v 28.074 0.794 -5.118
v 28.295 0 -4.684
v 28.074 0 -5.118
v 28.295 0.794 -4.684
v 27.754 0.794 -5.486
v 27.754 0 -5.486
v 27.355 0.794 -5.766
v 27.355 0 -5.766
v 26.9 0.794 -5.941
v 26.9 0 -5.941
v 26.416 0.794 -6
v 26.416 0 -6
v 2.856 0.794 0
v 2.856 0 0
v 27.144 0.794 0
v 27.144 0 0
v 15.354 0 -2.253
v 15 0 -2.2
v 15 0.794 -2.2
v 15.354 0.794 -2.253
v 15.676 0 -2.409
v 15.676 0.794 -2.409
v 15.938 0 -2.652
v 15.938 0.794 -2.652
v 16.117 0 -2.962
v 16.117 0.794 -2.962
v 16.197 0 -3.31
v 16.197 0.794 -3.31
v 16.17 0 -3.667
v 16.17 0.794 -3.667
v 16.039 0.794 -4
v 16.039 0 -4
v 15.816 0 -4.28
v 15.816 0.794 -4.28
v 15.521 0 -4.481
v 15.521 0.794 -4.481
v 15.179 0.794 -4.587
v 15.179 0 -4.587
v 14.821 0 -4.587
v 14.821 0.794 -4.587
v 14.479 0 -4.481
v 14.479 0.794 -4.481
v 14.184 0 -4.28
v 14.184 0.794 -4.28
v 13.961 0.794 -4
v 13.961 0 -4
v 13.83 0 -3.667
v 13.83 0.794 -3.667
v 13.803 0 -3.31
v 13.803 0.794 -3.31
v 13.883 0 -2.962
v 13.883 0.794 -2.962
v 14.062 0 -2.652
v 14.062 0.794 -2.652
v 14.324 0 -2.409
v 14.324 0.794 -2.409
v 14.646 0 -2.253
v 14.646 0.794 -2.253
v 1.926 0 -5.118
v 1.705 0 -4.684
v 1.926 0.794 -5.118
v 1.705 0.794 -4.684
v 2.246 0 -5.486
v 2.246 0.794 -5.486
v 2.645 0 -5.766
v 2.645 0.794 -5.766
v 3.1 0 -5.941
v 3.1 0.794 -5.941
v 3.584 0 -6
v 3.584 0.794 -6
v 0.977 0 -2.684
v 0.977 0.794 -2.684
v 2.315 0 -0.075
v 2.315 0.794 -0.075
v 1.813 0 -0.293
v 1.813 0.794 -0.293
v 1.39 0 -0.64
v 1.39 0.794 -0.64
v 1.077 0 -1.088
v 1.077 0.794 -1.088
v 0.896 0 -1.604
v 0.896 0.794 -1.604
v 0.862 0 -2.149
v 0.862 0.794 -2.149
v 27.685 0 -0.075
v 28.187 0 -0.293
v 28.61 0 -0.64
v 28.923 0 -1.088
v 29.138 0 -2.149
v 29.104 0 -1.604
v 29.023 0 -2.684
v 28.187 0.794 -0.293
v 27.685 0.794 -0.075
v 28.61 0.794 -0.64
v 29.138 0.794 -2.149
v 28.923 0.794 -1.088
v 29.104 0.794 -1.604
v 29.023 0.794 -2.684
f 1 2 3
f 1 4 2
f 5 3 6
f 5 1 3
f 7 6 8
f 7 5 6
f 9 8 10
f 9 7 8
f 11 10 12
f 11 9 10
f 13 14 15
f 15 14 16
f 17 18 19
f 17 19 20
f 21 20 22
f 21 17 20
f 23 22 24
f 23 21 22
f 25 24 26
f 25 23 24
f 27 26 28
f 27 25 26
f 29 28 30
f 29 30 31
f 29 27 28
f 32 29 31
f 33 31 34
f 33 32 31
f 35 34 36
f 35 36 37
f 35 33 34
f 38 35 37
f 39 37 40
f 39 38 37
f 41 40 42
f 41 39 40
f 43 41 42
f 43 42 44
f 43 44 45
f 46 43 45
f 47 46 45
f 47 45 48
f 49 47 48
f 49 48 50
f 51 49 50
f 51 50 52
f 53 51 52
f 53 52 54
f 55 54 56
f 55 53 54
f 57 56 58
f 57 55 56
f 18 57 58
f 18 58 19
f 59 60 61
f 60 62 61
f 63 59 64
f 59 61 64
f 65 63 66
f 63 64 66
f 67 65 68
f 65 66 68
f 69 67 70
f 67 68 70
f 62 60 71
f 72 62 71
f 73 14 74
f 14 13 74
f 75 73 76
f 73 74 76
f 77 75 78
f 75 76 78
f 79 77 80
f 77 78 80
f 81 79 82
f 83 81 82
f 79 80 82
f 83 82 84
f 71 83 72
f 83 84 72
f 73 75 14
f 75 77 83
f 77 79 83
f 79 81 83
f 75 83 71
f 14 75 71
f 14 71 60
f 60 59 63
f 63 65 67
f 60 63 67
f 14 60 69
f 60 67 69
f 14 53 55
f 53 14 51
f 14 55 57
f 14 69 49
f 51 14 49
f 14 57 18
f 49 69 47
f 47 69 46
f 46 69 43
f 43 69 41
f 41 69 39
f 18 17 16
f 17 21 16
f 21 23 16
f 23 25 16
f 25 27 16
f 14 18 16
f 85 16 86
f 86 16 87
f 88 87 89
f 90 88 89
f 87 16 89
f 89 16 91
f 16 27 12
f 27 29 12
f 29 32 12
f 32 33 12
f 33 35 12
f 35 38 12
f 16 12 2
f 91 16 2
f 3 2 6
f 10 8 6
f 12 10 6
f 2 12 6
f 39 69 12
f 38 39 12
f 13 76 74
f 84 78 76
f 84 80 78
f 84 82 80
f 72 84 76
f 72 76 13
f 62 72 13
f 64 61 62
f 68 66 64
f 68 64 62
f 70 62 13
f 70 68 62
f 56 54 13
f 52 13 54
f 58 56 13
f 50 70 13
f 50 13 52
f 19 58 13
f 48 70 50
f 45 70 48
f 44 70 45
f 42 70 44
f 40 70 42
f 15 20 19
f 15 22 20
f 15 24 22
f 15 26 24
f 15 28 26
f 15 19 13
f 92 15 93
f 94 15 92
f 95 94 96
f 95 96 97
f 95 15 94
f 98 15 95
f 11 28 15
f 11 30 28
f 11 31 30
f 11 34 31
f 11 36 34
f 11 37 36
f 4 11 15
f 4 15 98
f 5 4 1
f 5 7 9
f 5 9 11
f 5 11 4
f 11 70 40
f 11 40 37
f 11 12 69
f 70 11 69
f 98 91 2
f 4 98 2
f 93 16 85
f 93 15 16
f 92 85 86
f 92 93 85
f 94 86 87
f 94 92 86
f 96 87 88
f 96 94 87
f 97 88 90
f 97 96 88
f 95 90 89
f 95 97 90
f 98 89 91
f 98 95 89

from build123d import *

# Parameters (mm, degrees)
SKETCH1_R           = 1.2
BOSS_EXTRUDE1_DEPTH = 0.79375
FILLET1_R           = 2


with BuildPart() as part:
    # Sketch1 → Boss-Extrude1 (new body)
    with BuildSketch(Plane(origin=(0, 0, 0), x_dir=(1, 0, 0), z_dir=(0, 1, 0))):
        Polygon((0, 0), (30, 0), (27.816178594, 6), (2.183821406, 6), align=None)
        with Locations(Location((15, 3.4, 0), (0, 0, 270))):
            Circle(SKETCH1_R, mode=Mode.SUBTRACT)
    extrude(amount=BOSS_EXTRUDE1_DEPTH)

    # Fillet1
    fillet1_edges = [part.edges().sort_by_distance(p)[0] for p in [
        (2.183821406, 0.396875, -6),
        (27.816178594, 0.396875, -6),
        (30, 0.396875, 0),
        (0, 0.396875, 0),
    ]]
    fillet(fillet1_edges, radius=FILLET1_R)


solid = part.part
